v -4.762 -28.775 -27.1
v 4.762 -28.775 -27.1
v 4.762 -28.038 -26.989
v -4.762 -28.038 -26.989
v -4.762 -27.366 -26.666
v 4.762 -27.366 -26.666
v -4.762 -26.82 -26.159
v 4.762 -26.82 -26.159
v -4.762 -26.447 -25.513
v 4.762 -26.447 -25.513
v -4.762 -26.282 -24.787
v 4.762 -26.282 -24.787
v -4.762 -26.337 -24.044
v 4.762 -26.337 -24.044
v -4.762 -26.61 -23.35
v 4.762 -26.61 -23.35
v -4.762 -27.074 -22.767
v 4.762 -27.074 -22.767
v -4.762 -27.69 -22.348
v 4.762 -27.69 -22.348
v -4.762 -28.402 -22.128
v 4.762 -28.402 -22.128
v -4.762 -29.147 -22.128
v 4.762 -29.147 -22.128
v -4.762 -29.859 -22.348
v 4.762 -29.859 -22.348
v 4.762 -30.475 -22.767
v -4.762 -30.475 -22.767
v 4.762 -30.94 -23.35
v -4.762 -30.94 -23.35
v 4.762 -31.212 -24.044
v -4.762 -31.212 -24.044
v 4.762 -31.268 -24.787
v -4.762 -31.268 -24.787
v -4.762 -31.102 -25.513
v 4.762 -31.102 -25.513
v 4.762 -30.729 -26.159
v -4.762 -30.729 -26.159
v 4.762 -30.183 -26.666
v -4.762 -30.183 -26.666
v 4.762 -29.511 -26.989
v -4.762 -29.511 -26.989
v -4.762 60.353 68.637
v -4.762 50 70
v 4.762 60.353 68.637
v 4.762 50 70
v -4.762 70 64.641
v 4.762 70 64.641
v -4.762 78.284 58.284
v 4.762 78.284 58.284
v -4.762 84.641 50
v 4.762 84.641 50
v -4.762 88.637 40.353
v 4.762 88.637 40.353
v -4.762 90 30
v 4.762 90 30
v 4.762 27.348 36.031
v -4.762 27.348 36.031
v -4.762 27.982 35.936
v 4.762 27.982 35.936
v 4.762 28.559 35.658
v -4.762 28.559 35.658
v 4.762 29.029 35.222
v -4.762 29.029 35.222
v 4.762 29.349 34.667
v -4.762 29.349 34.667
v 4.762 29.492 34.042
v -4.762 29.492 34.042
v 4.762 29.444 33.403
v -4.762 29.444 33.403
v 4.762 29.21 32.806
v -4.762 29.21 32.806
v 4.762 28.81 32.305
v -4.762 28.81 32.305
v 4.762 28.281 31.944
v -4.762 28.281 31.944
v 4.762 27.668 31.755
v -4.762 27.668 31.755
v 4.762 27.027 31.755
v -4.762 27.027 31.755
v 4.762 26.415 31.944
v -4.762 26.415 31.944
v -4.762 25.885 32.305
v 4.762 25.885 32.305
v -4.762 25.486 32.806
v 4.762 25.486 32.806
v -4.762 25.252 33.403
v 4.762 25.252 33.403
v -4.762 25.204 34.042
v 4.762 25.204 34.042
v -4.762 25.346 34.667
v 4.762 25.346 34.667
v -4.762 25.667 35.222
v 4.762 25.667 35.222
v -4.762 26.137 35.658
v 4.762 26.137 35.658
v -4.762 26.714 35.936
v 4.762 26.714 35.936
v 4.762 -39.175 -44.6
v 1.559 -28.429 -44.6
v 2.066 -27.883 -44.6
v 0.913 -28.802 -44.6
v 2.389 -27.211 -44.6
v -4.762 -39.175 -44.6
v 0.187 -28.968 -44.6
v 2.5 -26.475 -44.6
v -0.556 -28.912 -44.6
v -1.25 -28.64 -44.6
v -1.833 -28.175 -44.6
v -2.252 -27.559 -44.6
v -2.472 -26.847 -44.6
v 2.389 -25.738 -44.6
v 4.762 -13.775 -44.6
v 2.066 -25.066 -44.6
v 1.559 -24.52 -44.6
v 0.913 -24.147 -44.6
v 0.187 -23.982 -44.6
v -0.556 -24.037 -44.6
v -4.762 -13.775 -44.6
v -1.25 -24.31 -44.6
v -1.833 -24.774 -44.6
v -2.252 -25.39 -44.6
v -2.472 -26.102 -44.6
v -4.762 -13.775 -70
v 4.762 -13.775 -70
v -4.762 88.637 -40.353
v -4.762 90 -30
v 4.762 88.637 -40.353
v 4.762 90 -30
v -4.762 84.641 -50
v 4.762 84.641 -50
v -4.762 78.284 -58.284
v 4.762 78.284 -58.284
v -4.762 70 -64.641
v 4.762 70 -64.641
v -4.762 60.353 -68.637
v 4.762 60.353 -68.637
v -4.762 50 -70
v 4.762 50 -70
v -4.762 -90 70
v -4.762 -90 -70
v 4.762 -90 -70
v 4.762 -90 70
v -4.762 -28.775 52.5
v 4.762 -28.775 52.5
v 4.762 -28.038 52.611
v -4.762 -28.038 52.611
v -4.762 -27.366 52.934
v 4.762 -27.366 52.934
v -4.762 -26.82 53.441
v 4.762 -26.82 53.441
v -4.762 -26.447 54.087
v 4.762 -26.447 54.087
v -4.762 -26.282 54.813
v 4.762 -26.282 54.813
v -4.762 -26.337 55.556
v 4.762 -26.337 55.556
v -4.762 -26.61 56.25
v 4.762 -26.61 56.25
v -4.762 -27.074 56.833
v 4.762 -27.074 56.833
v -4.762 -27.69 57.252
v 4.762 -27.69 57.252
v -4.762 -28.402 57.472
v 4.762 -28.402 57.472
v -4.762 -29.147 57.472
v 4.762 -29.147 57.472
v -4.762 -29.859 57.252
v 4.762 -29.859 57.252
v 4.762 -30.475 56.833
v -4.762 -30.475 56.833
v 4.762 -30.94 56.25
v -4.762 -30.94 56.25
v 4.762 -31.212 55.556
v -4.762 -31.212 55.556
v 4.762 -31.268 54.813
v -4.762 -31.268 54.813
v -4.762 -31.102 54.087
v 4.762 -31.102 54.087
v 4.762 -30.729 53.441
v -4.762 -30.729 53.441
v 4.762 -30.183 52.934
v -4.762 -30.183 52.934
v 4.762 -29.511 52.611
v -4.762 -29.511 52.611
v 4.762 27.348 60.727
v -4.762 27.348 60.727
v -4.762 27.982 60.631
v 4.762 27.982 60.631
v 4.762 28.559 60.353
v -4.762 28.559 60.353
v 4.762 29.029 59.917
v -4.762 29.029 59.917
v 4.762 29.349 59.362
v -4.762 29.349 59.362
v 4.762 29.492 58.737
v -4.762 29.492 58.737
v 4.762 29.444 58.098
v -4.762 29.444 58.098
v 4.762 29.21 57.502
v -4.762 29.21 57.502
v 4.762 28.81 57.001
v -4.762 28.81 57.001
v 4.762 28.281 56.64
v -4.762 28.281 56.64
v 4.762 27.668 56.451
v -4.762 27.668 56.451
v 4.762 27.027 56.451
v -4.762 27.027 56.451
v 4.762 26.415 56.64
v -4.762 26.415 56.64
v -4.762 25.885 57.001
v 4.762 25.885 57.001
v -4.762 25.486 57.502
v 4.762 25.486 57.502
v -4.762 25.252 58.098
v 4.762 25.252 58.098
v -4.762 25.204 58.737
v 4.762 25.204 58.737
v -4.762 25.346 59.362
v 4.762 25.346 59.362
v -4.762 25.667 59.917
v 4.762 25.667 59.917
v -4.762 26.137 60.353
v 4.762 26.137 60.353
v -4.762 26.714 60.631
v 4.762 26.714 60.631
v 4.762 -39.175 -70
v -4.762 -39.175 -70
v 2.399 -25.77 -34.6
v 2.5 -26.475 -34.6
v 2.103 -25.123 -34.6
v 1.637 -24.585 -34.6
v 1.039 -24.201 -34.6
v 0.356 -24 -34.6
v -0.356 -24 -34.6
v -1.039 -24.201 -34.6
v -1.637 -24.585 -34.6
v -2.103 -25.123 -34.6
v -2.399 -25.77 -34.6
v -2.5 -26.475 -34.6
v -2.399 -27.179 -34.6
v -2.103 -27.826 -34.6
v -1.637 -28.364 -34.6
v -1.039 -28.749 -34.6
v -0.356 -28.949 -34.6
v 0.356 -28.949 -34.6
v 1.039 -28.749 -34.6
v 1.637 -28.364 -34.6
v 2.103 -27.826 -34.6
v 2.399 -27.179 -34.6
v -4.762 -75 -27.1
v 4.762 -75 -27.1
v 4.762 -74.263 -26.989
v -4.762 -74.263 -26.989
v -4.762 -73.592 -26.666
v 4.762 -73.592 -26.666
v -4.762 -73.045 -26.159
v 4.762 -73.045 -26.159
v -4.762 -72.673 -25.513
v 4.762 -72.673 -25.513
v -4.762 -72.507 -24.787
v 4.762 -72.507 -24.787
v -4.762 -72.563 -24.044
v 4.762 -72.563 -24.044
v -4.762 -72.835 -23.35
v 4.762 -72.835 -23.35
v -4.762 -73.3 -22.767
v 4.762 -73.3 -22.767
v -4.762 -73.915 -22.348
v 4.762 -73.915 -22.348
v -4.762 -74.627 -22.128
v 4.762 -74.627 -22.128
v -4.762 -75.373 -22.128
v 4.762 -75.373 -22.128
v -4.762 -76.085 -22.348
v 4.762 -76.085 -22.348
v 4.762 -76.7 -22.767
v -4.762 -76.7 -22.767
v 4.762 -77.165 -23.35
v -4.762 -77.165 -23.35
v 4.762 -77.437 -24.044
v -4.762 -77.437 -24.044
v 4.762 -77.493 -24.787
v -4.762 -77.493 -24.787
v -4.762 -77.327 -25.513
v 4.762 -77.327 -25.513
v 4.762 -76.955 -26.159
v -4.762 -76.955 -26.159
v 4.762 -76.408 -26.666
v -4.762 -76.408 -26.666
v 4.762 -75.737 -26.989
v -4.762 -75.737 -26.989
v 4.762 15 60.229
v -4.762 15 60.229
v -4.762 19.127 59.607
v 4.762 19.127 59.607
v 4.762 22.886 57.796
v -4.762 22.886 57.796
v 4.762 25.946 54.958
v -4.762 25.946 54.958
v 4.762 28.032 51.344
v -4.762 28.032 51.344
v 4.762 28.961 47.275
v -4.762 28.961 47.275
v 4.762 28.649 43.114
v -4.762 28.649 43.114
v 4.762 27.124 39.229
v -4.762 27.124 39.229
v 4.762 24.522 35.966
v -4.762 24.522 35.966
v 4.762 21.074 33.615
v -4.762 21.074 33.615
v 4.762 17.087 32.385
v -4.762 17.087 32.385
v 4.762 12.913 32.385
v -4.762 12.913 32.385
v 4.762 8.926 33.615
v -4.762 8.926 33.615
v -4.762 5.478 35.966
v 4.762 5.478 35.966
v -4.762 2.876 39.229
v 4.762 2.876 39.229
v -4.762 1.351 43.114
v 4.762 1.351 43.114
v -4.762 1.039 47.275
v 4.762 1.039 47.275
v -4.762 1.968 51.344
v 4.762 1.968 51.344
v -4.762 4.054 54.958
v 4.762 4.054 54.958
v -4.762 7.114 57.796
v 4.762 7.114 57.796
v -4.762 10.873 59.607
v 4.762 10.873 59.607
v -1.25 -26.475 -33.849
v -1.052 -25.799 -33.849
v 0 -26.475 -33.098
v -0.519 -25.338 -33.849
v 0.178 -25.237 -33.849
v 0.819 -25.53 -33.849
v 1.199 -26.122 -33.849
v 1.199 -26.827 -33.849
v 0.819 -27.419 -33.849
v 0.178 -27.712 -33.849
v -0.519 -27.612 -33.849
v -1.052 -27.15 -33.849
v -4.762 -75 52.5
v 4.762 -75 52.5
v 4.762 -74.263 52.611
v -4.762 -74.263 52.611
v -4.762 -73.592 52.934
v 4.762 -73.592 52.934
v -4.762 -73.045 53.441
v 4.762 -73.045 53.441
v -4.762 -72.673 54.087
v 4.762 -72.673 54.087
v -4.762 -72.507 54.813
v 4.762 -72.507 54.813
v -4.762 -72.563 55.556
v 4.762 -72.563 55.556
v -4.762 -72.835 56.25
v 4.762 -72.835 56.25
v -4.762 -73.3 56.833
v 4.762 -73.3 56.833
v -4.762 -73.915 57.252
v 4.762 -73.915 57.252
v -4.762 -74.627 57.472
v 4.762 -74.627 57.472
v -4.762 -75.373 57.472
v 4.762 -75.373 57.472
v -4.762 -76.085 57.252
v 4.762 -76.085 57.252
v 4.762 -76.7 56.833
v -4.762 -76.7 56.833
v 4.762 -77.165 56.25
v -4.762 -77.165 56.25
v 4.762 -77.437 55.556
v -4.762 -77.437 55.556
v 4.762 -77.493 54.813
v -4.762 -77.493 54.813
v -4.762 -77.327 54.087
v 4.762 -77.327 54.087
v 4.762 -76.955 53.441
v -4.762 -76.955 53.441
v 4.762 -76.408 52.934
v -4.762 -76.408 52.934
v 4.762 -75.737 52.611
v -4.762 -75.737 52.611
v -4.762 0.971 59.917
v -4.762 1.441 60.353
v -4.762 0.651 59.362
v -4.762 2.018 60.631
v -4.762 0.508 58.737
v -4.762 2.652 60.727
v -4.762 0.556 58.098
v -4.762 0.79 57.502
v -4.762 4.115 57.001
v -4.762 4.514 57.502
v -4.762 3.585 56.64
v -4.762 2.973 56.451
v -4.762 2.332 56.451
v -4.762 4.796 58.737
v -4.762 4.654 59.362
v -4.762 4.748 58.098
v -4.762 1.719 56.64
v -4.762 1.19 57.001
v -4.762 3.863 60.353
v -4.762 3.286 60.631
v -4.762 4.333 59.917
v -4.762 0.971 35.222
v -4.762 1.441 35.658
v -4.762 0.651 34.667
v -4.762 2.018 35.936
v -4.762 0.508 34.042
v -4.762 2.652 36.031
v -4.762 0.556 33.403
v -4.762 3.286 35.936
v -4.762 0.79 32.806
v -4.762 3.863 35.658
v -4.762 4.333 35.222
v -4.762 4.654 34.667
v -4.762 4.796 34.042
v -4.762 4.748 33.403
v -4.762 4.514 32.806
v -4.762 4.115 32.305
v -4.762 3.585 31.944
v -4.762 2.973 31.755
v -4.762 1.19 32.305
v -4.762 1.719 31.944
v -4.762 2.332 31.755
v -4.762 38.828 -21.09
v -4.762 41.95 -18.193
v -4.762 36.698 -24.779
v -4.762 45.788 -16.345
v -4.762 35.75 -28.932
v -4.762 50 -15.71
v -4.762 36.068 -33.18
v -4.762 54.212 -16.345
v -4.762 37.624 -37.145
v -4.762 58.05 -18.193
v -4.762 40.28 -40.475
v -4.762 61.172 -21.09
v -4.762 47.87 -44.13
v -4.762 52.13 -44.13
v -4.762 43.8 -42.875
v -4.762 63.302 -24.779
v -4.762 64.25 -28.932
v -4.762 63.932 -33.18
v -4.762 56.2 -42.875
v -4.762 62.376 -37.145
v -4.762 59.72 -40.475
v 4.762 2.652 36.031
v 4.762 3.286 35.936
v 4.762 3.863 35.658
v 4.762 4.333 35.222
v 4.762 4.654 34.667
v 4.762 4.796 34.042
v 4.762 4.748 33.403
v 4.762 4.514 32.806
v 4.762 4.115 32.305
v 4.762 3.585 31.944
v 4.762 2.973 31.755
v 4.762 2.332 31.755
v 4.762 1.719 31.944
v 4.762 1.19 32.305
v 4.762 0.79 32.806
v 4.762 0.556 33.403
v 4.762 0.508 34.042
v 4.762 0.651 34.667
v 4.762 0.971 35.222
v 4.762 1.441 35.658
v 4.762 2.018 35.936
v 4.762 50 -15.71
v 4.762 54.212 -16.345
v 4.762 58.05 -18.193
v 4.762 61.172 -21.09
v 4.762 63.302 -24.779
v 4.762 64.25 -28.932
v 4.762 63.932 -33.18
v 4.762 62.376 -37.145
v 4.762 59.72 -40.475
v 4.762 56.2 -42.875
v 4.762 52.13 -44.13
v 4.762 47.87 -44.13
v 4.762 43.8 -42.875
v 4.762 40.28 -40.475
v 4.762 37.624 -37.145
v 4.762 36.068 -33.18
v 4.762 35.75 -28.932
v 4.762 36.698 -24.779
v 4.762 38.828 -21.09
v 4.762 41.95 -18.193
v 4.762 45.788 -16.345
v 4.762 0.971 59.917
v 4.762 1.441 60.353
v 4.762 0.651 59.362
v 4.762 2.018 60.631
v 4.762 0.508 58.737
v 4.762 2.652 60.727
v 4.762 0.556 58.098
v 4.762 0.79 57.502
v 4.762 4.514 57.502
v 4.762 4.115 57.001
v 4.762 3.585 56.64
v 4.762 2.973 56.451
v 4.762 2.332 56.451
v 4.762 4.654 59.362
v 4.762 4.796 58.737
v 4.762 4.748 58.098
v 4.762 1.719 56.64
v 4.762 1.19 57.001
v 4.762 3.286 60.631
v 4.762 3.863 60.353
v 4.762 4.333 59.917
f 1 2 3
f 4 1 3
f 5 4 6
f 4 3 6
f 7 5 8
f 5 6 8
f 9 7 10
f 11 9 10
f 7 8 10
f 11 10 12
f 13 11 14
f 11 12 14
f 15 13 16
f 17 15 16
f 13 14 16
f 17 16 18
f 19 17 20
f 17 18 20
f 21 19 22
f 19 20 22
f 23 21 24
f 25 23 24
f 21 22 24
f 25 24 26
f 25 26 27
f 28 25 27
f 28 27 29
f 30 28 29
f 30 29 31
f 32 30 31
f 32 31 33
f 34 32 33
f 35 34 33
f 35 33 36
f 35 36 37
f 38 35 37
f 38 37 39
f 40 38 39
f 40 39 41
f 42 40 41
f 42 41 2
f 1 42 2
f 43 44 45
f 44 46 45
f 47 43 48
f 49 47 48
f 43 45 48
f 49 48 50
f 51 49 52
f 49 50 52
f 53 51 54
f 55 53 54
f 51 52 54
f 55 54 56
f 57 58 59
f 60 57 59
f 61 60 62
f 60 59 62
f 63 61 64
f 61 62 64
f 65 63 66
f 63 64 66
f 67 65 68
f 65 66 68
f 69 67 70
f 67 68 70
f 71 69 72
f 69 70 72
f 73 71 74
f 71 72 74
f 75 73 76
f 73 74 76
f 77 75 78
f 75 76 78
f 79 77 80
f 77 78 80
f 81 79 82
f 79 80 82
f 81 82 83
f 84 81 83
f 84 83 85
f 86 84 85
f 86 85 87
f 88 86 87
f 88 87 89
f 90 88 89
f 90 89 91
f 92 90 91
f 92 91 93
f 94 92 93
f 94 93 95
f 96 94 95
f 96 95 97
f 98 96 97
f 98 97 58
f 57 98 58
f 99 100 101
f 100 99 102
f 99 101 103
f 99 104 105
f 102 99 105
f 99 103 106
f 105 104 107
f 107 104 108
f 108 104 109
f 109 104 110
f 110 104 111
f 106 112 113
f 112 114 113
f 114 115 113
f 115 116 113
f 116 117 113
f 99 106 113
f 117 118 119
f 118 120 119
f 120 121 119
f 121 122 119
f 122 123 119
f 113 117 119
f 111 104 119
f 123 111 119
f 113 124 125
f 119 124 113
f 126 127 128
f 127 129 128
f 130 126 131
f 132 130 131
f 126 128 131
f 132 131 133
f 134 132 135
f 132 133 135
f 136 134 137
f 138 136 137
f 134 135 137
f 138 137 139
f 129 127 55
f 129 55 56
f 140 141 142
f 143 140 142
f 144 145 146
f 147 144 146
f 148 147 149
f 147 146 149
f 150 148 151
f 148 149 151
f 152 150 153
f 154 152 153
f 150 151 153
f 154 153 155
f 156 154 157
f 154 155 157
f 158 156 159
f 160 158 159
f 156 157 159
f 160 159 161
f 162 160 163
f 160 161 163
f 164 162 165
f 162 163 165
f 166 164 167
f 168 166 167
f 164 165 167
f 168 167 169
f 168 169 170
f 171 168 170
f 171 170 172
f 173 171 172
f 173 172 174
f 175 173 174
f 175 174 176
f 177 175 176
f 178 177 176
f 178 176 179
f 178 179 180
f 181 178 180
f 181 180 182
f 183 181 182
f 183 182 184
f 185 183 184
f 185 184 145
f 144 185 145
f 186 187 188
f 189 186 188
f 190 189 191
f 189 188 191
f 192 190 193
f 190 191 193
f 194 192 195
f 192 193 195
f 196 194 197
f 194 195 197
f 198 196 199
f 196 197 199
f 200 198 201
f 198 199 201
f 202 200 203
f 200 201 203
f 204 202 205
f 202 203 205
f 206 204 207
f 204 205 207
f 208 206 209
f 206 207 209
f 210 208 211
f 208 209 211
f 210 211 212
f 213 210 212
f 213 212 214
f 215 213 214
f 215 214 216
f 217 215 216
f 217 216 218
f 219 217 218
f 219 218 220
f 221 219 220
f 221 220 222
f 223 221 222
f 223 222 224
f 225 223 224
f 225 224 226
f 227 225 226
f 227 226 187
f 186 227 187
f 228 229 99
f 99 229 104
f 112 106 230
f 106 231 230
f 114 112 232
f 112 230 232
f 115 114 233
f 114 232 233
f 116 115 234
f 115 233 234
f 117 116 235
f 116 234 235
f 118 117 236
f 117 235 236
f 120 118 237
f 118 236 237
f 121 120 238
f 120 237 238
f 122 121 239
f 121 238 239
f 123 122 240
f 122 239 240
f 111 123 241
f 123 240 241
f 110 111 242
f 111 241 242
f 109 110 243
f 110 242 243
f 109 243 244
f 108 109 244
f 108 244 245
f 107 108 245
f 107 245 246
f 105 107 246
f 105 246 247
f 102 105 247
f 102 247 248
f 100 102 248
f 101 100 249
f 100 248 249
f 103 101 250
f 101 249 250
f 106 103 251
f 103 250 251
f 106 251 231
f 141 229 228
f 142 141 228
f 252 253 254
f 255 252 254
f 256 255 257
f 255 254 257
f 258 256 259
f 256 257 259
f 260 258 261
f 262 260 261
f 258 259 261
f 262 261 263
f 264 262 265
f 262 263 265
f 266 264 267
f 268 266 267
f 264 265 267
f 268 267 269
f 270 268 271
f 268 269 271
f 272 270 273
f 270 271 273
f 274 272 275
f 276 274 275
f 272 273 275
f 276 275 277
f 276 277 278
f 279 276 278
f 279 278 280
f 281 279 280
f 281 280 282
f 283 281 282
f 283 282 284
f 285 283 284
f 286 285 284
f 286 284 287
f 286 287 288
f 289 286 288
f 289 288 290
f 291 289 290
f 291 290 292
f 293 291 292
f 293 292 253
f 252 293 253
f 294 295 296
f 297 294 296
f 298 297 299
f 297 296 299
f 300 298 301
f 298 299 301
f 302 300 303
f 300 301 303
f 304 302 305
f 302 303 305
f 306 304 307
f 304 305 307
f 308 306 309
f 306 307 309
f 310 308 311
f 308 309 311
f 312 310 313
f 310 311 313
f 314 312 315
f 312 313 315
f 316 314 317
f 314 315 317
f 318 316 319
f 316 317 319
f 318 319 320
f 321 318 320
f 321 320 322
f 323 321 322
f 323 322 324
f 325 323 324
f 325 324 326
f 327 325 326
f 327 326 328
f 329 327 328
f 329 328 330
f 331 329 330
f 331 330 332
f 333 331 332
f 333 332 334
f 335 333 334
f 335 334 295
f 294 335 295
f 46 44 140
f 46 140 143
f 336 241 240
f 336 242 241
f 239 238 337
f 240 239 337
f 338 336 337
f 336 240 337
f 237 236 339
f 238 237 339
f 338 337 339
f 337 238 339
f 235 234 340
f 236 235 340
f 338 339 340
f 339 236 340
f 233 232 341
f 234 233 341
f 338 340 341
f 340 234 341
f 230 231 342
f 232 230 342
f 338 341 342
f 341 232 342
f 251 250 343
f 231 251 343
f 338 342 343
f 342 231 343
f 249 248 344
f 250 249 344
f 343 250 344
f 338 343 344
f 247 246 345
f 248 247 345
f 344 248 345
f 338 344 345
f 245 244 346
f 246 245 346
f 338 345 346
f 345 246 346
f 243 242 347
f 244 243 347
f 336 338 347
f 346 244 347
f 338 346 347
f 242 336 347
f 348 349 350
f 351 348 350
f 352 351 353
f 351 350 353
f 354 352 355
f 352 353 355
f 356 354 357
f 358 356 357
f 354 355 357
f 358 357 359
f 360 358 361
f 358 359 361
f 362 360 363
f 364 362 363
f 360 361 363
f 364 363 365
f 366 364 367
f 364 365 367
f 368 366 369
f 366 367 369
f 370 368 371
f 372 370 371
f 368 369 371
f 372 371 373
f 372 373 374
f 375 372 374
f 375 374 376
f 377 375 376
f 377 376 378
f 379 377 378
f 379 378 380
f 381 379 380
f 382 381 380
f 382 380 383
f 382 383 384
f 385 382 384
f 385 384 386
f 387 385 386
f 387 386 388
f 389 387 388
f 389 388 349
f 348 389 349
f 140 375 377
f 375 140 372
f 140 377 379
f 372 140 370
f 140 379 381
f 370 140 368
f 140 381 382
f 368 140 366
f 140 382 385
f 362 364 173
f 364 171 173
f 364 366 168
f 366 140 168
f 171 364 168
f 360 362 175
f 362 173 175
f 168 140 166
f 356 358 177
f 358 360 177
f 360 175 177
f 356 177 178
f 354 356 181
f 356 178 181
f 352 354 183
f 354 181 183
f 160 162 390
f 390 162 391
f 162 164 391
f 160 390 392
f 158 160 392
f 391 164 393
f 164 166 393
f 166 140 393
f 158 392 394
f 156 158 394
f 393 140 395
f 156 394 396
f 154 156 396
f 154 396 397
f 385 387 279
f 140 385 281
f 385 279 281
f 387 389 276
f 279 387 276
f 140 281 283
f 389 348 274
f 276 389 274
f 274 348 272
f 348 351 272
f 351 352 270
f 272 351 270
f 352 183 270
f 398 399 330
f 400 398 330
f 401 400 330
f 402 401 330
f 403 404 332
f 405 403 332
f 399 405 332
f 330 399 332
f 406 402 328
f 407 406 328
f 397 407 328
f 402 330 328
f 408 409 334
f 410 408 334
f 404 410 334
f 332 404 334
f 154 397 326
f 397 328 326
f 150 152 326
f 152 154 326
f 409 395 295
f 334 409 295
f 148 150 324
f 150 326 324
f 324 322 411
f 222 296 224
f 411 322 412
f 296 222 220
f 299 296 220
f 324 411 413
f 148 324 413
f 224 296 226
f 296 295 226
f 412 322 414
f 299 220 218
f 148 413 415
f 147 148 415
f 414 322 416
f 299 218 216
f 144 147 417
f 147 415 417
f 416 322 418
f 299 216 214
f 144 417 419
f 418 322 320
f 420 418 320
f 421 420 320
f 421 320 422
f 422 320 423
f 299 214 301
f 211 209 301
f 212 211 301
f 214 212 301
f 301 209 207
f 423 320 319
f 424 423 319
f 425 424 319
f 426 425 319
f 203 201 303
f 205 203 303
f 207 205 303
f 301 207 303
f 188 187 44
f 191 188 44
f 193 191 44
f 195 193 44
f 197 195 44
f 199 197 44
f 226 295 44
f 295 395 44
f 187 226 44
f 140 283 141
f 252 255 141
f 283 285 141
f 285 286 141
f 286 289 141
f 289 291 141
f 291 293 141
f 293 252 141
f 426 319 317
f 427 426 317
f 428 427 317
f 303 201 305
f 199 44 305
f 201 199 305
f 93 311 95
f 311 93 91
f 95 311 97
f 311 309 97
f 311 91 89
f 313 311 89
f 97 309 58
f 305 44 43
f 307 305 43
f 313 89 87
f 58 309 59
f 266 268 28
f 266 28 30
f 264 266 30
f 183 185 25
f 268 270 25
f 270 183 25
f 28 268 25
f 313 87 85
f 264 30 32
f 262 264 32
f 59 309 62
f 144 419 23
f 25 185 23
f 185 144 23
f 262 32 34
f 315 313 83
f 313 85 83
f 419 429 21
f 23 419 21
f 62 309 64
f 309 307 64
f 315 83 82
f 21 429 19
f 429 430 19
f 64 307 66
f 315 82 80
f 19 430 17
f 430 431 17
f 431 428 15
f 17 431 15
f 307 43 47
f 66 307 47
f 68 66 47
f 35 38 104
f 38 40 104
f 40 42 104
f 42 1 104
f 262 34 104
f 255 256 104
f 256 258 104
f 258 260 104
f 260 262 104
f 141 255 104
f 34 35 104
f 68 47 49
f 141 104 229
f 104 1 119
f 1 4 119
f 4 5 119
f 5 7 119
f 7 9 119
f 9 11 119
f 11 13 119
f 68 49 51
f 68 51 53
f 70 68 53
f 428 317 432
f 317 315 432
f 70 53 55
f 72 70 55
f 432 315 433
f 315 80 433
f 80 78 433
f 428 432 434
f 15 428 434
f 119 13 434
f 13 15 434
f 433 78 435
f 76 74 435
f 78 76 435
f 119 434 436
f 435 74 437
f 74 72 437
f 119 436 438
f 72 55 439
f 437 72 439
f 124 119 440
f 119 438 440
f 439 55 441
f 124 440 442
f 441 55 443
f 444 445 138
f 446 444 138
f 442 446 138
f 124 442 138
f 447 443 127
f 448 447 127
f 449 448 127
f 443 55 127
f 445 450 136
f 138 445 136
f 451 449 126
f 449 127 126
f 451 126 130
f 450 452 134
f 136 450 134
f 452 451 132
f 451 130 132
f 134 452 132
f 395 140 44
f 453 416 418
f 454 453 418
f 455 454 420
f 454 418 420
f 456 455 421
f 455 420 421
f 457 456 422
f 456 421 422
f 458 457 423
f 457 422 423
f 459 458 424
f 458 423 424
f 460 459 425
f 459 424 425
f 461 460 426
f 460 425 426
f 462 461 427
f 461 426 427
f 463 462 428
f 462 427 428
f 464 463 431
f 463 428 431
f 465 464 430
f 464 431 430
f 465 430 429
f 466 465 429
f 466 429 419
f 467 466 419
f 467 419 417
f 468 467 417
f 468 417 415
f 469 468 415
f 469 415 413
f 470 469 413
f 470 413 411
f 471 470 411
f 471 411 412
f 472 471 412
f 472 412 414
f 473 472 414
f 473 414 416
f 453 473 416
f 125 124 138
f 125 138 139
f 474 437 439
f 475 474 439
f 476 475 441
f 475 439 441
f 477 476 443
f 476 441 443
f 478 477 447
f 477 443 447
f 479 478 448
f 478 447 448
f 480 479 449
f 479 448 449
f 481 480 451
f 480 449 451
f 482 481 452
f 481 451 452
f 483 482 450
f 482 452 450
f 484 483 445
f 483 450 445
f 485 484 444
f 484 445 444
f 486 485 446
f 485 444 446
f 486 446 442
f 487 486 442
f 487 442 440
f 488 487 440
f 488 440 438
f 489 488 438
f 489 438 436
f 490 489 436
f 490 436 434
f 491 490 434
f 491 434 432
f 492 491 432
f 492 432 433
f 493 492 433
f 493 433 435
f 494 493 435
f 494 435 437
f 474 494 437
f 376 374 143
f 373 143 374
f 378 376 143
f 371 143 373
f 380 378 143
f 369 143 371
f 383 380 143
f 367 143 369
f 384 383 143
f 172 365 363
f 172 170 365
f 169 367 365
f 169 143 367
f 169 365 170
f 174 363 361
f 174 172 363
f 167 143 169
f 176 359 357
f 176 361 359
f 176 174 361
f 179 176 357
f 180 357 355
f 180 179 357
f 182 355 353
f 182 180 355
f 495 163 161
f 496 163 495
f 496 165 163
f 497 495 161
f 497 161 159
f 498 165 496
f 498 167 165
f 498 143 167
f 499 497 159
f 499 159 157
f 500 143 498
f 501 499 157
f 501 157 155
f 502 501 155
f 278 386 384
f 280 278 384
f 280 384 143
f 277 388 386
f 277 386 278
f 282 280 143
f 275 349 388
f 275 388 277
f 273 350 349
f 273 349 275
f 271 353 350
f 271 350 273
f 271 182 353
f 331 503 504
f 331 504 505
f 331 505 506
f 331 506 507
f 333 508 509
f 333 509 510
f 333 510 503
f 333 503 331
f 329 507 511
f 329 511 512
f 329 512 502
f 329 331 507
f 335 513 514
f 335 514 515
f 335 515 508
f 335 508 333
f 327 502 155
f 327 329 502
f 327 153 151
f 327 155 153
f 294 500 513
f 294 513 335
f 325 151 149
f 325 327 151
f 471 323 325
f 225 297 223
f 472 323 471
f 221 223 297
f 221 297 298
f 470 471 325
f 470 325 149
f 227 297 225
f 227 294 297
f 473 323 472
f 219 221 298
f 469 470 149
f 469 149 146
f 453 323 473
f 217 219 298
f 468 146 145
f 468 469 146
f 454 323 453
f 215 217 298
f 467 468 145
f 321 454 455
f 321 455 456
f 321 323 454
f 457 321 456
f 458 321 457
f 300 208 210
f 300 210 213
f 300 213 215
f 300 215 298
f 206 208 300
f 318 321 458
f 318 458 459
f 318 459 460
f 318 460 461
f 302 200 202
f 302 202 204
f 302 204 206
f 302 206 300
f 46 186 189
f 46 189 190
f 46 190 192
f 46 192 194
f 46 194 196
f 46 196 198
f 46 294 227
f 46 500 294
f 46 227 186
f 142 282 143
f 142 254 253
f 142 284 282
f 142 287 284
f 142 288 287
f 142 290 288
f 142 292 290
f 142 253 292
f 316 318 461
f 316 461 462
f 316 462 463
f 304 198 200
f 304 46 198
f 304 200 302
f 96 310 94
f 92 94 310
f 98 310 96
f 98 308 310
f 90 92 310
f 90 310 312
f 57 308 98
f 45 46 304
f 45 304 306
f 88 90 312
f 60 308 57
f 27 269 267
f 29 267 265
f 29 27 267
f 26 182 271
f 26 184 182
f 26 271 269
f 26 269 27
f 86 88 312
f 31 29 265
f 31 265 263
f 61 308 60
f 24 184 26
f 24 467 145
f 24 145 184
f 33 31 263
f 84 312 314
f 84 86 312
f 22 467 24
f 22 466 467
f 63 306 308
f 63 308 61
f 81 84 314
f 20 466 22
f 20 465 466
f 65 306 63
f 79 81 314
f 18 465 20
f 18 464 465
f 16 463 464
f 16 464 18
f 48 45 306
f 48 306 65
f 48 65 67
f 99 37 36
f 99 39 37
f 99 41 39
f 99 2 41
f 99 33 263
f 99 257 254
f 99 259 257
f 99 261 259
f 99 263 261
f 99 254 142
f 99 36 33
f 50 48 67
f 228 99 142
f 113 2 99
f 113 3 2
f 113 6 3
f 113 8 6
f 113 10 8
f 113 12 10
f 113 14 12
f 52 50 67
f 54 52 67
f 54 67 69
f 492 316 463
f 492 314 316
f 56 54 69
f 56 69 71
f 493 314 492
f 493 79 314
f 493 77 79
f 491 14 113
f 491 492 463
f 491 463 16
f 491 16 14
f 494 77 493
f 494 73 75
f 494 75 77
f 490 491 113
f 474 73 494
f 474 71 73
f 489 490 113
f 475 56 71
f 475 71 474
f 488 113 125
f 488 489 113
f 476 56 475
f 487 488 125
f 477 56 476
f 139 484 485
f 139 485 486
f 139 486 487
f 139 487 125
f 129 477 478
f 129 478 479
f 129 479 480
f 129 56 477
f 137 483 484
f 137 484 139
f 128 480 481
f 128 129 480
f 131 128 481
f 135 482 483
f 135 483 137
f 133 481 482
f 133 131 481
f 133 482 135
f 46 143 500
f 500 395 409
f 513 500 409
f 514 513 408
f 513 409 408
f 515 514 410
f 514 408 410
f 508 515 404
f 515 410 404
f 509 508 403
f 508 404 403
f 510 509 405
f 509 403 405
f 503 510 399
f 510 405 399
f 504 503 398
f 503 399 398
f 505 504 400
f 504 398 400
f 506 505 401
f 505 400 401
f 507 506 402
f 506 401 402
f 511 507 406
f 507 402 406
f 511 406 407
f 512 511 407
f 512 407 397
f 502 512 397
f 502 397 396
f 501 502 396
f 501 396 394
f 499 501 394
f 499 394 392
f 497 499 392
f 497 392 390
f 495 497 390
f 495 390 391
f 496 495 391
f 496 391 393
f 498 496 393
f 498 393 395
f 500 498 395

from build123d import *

# Parameters (mm, degrees)
SKETCH1_W             = 9.525
SKETCH1_H             = 140
BOSS_EXTRUDE1_DEPTH   = 90
SKETCH3_R             = 14.29
SKETCH3_R_2           = 2.15
SKETCH3_R_3           = 14
CUT_EXTRUDE2_DEPTH    = 28.575
SKETCH5_W             = 25.4
SKETCH5_H             = 25.4
CUT_EXTRUDE4_DEPTH    = 10.525
M6_TAPPED_HOLE1_D     = 5
M6_TAPPED_HOLE1_DEPTH = 10
M6_TAPPED_HOLE1_TIP   = 1.502151548
M6_TAPPED_HOLE2_D     = 5
FILLET1_R             = 40


with BuildPart() as part:
    # Sketch1 → Boss-Extrude1 (new body, symmetric)
    with BuildSketch(Plane(origin=(0, 0, 0), x_dir=(1, 0, 0), z_dir=(0, 1, 0))):
        Rectangle(SKETCH1_W, SKETCH1_H)
    extrude(amount=BOSS_EXTRUDE1_DEPTH, both=True)

    # Sketch3 → Cut-Extrude2 (cut)
    with BuildSketch(Plane.ZY.offset(4.7625)):
        with Locations((-30, 50)):
            Circle(SKETCH3_R)
        with Locations((33.881108209, 27.347852166)):
            Circle(SKETCH3_R_2)
        with Locations((58.576812542, 27.347852166)):
            Circle(SKETCH3_R_2)
        with Locations((33.881108209, 2.652147834)):
            Circle(SKETCH3_R_2)
        with Locations((58.576812542, 2.652147834)):
            Circle(SKETCH3_R_2)
        with Locations((46.228960376, 15)):
            Circle(SKETCH3_R_3)
    extrude(amount=-CUT_EXTRUDE2_DEPTH, mode=Mode.SUBTRACT)

    # Sketch5 → Cut-Extrude4 (cut, through all)
    with BuildSketch(Plane.ZY.offset(4.7625)):
        with Locations((-57.3, -26.4746)):
            Rectangle(SKETCH5_W, SKETCH5_H)
    extrude(amount=-CUT_EXTRUDE4_DEPTH, mode=Mode.SUBTRACT)

    # M6 Tapped Hole1
    with Locations(Plane(origin=(0, 0, -44.6), x_dir=(-1, 0, 0), z_dir=(0, 0, -1))):
        with Locations((0, -26.4746)):
            Hole(M6_TAPPED_HOLE1_D / 2, depth=M6_TAPPED_HOLE1_DEPTH)
            with Locations((0, 0, -(M6_TAPPED_HOLE1_DEPTH + M6_TAPPED_HOLE1_TIP / 2))):  # 118° drill point
                Cone(0, M6_TAPPED_HOLE1_D / 2, M6_TAPPED_HOLE1_TIP, mode=Mode.SUBTRACT)

    # M6 Tapped Hole2 (through all)
    with Locations(Plane.ZY.offset(4.7625)):
        with Locations((-24.6, -28.7746), (55, -28.7746), (-24.6, -75), (55, -75)):
            Hole(M6_TAPPED_HOLE2_D / 2)

    # Fillet1
    fillet1_edges = [part.edges().sort_by_distance(p)[0] for p in [
        (0, 90, 70),
        (0, 90, -70),
    ]]
    fillet(fillet1_edges, radius=FILLET1_R)


solid = part.part
